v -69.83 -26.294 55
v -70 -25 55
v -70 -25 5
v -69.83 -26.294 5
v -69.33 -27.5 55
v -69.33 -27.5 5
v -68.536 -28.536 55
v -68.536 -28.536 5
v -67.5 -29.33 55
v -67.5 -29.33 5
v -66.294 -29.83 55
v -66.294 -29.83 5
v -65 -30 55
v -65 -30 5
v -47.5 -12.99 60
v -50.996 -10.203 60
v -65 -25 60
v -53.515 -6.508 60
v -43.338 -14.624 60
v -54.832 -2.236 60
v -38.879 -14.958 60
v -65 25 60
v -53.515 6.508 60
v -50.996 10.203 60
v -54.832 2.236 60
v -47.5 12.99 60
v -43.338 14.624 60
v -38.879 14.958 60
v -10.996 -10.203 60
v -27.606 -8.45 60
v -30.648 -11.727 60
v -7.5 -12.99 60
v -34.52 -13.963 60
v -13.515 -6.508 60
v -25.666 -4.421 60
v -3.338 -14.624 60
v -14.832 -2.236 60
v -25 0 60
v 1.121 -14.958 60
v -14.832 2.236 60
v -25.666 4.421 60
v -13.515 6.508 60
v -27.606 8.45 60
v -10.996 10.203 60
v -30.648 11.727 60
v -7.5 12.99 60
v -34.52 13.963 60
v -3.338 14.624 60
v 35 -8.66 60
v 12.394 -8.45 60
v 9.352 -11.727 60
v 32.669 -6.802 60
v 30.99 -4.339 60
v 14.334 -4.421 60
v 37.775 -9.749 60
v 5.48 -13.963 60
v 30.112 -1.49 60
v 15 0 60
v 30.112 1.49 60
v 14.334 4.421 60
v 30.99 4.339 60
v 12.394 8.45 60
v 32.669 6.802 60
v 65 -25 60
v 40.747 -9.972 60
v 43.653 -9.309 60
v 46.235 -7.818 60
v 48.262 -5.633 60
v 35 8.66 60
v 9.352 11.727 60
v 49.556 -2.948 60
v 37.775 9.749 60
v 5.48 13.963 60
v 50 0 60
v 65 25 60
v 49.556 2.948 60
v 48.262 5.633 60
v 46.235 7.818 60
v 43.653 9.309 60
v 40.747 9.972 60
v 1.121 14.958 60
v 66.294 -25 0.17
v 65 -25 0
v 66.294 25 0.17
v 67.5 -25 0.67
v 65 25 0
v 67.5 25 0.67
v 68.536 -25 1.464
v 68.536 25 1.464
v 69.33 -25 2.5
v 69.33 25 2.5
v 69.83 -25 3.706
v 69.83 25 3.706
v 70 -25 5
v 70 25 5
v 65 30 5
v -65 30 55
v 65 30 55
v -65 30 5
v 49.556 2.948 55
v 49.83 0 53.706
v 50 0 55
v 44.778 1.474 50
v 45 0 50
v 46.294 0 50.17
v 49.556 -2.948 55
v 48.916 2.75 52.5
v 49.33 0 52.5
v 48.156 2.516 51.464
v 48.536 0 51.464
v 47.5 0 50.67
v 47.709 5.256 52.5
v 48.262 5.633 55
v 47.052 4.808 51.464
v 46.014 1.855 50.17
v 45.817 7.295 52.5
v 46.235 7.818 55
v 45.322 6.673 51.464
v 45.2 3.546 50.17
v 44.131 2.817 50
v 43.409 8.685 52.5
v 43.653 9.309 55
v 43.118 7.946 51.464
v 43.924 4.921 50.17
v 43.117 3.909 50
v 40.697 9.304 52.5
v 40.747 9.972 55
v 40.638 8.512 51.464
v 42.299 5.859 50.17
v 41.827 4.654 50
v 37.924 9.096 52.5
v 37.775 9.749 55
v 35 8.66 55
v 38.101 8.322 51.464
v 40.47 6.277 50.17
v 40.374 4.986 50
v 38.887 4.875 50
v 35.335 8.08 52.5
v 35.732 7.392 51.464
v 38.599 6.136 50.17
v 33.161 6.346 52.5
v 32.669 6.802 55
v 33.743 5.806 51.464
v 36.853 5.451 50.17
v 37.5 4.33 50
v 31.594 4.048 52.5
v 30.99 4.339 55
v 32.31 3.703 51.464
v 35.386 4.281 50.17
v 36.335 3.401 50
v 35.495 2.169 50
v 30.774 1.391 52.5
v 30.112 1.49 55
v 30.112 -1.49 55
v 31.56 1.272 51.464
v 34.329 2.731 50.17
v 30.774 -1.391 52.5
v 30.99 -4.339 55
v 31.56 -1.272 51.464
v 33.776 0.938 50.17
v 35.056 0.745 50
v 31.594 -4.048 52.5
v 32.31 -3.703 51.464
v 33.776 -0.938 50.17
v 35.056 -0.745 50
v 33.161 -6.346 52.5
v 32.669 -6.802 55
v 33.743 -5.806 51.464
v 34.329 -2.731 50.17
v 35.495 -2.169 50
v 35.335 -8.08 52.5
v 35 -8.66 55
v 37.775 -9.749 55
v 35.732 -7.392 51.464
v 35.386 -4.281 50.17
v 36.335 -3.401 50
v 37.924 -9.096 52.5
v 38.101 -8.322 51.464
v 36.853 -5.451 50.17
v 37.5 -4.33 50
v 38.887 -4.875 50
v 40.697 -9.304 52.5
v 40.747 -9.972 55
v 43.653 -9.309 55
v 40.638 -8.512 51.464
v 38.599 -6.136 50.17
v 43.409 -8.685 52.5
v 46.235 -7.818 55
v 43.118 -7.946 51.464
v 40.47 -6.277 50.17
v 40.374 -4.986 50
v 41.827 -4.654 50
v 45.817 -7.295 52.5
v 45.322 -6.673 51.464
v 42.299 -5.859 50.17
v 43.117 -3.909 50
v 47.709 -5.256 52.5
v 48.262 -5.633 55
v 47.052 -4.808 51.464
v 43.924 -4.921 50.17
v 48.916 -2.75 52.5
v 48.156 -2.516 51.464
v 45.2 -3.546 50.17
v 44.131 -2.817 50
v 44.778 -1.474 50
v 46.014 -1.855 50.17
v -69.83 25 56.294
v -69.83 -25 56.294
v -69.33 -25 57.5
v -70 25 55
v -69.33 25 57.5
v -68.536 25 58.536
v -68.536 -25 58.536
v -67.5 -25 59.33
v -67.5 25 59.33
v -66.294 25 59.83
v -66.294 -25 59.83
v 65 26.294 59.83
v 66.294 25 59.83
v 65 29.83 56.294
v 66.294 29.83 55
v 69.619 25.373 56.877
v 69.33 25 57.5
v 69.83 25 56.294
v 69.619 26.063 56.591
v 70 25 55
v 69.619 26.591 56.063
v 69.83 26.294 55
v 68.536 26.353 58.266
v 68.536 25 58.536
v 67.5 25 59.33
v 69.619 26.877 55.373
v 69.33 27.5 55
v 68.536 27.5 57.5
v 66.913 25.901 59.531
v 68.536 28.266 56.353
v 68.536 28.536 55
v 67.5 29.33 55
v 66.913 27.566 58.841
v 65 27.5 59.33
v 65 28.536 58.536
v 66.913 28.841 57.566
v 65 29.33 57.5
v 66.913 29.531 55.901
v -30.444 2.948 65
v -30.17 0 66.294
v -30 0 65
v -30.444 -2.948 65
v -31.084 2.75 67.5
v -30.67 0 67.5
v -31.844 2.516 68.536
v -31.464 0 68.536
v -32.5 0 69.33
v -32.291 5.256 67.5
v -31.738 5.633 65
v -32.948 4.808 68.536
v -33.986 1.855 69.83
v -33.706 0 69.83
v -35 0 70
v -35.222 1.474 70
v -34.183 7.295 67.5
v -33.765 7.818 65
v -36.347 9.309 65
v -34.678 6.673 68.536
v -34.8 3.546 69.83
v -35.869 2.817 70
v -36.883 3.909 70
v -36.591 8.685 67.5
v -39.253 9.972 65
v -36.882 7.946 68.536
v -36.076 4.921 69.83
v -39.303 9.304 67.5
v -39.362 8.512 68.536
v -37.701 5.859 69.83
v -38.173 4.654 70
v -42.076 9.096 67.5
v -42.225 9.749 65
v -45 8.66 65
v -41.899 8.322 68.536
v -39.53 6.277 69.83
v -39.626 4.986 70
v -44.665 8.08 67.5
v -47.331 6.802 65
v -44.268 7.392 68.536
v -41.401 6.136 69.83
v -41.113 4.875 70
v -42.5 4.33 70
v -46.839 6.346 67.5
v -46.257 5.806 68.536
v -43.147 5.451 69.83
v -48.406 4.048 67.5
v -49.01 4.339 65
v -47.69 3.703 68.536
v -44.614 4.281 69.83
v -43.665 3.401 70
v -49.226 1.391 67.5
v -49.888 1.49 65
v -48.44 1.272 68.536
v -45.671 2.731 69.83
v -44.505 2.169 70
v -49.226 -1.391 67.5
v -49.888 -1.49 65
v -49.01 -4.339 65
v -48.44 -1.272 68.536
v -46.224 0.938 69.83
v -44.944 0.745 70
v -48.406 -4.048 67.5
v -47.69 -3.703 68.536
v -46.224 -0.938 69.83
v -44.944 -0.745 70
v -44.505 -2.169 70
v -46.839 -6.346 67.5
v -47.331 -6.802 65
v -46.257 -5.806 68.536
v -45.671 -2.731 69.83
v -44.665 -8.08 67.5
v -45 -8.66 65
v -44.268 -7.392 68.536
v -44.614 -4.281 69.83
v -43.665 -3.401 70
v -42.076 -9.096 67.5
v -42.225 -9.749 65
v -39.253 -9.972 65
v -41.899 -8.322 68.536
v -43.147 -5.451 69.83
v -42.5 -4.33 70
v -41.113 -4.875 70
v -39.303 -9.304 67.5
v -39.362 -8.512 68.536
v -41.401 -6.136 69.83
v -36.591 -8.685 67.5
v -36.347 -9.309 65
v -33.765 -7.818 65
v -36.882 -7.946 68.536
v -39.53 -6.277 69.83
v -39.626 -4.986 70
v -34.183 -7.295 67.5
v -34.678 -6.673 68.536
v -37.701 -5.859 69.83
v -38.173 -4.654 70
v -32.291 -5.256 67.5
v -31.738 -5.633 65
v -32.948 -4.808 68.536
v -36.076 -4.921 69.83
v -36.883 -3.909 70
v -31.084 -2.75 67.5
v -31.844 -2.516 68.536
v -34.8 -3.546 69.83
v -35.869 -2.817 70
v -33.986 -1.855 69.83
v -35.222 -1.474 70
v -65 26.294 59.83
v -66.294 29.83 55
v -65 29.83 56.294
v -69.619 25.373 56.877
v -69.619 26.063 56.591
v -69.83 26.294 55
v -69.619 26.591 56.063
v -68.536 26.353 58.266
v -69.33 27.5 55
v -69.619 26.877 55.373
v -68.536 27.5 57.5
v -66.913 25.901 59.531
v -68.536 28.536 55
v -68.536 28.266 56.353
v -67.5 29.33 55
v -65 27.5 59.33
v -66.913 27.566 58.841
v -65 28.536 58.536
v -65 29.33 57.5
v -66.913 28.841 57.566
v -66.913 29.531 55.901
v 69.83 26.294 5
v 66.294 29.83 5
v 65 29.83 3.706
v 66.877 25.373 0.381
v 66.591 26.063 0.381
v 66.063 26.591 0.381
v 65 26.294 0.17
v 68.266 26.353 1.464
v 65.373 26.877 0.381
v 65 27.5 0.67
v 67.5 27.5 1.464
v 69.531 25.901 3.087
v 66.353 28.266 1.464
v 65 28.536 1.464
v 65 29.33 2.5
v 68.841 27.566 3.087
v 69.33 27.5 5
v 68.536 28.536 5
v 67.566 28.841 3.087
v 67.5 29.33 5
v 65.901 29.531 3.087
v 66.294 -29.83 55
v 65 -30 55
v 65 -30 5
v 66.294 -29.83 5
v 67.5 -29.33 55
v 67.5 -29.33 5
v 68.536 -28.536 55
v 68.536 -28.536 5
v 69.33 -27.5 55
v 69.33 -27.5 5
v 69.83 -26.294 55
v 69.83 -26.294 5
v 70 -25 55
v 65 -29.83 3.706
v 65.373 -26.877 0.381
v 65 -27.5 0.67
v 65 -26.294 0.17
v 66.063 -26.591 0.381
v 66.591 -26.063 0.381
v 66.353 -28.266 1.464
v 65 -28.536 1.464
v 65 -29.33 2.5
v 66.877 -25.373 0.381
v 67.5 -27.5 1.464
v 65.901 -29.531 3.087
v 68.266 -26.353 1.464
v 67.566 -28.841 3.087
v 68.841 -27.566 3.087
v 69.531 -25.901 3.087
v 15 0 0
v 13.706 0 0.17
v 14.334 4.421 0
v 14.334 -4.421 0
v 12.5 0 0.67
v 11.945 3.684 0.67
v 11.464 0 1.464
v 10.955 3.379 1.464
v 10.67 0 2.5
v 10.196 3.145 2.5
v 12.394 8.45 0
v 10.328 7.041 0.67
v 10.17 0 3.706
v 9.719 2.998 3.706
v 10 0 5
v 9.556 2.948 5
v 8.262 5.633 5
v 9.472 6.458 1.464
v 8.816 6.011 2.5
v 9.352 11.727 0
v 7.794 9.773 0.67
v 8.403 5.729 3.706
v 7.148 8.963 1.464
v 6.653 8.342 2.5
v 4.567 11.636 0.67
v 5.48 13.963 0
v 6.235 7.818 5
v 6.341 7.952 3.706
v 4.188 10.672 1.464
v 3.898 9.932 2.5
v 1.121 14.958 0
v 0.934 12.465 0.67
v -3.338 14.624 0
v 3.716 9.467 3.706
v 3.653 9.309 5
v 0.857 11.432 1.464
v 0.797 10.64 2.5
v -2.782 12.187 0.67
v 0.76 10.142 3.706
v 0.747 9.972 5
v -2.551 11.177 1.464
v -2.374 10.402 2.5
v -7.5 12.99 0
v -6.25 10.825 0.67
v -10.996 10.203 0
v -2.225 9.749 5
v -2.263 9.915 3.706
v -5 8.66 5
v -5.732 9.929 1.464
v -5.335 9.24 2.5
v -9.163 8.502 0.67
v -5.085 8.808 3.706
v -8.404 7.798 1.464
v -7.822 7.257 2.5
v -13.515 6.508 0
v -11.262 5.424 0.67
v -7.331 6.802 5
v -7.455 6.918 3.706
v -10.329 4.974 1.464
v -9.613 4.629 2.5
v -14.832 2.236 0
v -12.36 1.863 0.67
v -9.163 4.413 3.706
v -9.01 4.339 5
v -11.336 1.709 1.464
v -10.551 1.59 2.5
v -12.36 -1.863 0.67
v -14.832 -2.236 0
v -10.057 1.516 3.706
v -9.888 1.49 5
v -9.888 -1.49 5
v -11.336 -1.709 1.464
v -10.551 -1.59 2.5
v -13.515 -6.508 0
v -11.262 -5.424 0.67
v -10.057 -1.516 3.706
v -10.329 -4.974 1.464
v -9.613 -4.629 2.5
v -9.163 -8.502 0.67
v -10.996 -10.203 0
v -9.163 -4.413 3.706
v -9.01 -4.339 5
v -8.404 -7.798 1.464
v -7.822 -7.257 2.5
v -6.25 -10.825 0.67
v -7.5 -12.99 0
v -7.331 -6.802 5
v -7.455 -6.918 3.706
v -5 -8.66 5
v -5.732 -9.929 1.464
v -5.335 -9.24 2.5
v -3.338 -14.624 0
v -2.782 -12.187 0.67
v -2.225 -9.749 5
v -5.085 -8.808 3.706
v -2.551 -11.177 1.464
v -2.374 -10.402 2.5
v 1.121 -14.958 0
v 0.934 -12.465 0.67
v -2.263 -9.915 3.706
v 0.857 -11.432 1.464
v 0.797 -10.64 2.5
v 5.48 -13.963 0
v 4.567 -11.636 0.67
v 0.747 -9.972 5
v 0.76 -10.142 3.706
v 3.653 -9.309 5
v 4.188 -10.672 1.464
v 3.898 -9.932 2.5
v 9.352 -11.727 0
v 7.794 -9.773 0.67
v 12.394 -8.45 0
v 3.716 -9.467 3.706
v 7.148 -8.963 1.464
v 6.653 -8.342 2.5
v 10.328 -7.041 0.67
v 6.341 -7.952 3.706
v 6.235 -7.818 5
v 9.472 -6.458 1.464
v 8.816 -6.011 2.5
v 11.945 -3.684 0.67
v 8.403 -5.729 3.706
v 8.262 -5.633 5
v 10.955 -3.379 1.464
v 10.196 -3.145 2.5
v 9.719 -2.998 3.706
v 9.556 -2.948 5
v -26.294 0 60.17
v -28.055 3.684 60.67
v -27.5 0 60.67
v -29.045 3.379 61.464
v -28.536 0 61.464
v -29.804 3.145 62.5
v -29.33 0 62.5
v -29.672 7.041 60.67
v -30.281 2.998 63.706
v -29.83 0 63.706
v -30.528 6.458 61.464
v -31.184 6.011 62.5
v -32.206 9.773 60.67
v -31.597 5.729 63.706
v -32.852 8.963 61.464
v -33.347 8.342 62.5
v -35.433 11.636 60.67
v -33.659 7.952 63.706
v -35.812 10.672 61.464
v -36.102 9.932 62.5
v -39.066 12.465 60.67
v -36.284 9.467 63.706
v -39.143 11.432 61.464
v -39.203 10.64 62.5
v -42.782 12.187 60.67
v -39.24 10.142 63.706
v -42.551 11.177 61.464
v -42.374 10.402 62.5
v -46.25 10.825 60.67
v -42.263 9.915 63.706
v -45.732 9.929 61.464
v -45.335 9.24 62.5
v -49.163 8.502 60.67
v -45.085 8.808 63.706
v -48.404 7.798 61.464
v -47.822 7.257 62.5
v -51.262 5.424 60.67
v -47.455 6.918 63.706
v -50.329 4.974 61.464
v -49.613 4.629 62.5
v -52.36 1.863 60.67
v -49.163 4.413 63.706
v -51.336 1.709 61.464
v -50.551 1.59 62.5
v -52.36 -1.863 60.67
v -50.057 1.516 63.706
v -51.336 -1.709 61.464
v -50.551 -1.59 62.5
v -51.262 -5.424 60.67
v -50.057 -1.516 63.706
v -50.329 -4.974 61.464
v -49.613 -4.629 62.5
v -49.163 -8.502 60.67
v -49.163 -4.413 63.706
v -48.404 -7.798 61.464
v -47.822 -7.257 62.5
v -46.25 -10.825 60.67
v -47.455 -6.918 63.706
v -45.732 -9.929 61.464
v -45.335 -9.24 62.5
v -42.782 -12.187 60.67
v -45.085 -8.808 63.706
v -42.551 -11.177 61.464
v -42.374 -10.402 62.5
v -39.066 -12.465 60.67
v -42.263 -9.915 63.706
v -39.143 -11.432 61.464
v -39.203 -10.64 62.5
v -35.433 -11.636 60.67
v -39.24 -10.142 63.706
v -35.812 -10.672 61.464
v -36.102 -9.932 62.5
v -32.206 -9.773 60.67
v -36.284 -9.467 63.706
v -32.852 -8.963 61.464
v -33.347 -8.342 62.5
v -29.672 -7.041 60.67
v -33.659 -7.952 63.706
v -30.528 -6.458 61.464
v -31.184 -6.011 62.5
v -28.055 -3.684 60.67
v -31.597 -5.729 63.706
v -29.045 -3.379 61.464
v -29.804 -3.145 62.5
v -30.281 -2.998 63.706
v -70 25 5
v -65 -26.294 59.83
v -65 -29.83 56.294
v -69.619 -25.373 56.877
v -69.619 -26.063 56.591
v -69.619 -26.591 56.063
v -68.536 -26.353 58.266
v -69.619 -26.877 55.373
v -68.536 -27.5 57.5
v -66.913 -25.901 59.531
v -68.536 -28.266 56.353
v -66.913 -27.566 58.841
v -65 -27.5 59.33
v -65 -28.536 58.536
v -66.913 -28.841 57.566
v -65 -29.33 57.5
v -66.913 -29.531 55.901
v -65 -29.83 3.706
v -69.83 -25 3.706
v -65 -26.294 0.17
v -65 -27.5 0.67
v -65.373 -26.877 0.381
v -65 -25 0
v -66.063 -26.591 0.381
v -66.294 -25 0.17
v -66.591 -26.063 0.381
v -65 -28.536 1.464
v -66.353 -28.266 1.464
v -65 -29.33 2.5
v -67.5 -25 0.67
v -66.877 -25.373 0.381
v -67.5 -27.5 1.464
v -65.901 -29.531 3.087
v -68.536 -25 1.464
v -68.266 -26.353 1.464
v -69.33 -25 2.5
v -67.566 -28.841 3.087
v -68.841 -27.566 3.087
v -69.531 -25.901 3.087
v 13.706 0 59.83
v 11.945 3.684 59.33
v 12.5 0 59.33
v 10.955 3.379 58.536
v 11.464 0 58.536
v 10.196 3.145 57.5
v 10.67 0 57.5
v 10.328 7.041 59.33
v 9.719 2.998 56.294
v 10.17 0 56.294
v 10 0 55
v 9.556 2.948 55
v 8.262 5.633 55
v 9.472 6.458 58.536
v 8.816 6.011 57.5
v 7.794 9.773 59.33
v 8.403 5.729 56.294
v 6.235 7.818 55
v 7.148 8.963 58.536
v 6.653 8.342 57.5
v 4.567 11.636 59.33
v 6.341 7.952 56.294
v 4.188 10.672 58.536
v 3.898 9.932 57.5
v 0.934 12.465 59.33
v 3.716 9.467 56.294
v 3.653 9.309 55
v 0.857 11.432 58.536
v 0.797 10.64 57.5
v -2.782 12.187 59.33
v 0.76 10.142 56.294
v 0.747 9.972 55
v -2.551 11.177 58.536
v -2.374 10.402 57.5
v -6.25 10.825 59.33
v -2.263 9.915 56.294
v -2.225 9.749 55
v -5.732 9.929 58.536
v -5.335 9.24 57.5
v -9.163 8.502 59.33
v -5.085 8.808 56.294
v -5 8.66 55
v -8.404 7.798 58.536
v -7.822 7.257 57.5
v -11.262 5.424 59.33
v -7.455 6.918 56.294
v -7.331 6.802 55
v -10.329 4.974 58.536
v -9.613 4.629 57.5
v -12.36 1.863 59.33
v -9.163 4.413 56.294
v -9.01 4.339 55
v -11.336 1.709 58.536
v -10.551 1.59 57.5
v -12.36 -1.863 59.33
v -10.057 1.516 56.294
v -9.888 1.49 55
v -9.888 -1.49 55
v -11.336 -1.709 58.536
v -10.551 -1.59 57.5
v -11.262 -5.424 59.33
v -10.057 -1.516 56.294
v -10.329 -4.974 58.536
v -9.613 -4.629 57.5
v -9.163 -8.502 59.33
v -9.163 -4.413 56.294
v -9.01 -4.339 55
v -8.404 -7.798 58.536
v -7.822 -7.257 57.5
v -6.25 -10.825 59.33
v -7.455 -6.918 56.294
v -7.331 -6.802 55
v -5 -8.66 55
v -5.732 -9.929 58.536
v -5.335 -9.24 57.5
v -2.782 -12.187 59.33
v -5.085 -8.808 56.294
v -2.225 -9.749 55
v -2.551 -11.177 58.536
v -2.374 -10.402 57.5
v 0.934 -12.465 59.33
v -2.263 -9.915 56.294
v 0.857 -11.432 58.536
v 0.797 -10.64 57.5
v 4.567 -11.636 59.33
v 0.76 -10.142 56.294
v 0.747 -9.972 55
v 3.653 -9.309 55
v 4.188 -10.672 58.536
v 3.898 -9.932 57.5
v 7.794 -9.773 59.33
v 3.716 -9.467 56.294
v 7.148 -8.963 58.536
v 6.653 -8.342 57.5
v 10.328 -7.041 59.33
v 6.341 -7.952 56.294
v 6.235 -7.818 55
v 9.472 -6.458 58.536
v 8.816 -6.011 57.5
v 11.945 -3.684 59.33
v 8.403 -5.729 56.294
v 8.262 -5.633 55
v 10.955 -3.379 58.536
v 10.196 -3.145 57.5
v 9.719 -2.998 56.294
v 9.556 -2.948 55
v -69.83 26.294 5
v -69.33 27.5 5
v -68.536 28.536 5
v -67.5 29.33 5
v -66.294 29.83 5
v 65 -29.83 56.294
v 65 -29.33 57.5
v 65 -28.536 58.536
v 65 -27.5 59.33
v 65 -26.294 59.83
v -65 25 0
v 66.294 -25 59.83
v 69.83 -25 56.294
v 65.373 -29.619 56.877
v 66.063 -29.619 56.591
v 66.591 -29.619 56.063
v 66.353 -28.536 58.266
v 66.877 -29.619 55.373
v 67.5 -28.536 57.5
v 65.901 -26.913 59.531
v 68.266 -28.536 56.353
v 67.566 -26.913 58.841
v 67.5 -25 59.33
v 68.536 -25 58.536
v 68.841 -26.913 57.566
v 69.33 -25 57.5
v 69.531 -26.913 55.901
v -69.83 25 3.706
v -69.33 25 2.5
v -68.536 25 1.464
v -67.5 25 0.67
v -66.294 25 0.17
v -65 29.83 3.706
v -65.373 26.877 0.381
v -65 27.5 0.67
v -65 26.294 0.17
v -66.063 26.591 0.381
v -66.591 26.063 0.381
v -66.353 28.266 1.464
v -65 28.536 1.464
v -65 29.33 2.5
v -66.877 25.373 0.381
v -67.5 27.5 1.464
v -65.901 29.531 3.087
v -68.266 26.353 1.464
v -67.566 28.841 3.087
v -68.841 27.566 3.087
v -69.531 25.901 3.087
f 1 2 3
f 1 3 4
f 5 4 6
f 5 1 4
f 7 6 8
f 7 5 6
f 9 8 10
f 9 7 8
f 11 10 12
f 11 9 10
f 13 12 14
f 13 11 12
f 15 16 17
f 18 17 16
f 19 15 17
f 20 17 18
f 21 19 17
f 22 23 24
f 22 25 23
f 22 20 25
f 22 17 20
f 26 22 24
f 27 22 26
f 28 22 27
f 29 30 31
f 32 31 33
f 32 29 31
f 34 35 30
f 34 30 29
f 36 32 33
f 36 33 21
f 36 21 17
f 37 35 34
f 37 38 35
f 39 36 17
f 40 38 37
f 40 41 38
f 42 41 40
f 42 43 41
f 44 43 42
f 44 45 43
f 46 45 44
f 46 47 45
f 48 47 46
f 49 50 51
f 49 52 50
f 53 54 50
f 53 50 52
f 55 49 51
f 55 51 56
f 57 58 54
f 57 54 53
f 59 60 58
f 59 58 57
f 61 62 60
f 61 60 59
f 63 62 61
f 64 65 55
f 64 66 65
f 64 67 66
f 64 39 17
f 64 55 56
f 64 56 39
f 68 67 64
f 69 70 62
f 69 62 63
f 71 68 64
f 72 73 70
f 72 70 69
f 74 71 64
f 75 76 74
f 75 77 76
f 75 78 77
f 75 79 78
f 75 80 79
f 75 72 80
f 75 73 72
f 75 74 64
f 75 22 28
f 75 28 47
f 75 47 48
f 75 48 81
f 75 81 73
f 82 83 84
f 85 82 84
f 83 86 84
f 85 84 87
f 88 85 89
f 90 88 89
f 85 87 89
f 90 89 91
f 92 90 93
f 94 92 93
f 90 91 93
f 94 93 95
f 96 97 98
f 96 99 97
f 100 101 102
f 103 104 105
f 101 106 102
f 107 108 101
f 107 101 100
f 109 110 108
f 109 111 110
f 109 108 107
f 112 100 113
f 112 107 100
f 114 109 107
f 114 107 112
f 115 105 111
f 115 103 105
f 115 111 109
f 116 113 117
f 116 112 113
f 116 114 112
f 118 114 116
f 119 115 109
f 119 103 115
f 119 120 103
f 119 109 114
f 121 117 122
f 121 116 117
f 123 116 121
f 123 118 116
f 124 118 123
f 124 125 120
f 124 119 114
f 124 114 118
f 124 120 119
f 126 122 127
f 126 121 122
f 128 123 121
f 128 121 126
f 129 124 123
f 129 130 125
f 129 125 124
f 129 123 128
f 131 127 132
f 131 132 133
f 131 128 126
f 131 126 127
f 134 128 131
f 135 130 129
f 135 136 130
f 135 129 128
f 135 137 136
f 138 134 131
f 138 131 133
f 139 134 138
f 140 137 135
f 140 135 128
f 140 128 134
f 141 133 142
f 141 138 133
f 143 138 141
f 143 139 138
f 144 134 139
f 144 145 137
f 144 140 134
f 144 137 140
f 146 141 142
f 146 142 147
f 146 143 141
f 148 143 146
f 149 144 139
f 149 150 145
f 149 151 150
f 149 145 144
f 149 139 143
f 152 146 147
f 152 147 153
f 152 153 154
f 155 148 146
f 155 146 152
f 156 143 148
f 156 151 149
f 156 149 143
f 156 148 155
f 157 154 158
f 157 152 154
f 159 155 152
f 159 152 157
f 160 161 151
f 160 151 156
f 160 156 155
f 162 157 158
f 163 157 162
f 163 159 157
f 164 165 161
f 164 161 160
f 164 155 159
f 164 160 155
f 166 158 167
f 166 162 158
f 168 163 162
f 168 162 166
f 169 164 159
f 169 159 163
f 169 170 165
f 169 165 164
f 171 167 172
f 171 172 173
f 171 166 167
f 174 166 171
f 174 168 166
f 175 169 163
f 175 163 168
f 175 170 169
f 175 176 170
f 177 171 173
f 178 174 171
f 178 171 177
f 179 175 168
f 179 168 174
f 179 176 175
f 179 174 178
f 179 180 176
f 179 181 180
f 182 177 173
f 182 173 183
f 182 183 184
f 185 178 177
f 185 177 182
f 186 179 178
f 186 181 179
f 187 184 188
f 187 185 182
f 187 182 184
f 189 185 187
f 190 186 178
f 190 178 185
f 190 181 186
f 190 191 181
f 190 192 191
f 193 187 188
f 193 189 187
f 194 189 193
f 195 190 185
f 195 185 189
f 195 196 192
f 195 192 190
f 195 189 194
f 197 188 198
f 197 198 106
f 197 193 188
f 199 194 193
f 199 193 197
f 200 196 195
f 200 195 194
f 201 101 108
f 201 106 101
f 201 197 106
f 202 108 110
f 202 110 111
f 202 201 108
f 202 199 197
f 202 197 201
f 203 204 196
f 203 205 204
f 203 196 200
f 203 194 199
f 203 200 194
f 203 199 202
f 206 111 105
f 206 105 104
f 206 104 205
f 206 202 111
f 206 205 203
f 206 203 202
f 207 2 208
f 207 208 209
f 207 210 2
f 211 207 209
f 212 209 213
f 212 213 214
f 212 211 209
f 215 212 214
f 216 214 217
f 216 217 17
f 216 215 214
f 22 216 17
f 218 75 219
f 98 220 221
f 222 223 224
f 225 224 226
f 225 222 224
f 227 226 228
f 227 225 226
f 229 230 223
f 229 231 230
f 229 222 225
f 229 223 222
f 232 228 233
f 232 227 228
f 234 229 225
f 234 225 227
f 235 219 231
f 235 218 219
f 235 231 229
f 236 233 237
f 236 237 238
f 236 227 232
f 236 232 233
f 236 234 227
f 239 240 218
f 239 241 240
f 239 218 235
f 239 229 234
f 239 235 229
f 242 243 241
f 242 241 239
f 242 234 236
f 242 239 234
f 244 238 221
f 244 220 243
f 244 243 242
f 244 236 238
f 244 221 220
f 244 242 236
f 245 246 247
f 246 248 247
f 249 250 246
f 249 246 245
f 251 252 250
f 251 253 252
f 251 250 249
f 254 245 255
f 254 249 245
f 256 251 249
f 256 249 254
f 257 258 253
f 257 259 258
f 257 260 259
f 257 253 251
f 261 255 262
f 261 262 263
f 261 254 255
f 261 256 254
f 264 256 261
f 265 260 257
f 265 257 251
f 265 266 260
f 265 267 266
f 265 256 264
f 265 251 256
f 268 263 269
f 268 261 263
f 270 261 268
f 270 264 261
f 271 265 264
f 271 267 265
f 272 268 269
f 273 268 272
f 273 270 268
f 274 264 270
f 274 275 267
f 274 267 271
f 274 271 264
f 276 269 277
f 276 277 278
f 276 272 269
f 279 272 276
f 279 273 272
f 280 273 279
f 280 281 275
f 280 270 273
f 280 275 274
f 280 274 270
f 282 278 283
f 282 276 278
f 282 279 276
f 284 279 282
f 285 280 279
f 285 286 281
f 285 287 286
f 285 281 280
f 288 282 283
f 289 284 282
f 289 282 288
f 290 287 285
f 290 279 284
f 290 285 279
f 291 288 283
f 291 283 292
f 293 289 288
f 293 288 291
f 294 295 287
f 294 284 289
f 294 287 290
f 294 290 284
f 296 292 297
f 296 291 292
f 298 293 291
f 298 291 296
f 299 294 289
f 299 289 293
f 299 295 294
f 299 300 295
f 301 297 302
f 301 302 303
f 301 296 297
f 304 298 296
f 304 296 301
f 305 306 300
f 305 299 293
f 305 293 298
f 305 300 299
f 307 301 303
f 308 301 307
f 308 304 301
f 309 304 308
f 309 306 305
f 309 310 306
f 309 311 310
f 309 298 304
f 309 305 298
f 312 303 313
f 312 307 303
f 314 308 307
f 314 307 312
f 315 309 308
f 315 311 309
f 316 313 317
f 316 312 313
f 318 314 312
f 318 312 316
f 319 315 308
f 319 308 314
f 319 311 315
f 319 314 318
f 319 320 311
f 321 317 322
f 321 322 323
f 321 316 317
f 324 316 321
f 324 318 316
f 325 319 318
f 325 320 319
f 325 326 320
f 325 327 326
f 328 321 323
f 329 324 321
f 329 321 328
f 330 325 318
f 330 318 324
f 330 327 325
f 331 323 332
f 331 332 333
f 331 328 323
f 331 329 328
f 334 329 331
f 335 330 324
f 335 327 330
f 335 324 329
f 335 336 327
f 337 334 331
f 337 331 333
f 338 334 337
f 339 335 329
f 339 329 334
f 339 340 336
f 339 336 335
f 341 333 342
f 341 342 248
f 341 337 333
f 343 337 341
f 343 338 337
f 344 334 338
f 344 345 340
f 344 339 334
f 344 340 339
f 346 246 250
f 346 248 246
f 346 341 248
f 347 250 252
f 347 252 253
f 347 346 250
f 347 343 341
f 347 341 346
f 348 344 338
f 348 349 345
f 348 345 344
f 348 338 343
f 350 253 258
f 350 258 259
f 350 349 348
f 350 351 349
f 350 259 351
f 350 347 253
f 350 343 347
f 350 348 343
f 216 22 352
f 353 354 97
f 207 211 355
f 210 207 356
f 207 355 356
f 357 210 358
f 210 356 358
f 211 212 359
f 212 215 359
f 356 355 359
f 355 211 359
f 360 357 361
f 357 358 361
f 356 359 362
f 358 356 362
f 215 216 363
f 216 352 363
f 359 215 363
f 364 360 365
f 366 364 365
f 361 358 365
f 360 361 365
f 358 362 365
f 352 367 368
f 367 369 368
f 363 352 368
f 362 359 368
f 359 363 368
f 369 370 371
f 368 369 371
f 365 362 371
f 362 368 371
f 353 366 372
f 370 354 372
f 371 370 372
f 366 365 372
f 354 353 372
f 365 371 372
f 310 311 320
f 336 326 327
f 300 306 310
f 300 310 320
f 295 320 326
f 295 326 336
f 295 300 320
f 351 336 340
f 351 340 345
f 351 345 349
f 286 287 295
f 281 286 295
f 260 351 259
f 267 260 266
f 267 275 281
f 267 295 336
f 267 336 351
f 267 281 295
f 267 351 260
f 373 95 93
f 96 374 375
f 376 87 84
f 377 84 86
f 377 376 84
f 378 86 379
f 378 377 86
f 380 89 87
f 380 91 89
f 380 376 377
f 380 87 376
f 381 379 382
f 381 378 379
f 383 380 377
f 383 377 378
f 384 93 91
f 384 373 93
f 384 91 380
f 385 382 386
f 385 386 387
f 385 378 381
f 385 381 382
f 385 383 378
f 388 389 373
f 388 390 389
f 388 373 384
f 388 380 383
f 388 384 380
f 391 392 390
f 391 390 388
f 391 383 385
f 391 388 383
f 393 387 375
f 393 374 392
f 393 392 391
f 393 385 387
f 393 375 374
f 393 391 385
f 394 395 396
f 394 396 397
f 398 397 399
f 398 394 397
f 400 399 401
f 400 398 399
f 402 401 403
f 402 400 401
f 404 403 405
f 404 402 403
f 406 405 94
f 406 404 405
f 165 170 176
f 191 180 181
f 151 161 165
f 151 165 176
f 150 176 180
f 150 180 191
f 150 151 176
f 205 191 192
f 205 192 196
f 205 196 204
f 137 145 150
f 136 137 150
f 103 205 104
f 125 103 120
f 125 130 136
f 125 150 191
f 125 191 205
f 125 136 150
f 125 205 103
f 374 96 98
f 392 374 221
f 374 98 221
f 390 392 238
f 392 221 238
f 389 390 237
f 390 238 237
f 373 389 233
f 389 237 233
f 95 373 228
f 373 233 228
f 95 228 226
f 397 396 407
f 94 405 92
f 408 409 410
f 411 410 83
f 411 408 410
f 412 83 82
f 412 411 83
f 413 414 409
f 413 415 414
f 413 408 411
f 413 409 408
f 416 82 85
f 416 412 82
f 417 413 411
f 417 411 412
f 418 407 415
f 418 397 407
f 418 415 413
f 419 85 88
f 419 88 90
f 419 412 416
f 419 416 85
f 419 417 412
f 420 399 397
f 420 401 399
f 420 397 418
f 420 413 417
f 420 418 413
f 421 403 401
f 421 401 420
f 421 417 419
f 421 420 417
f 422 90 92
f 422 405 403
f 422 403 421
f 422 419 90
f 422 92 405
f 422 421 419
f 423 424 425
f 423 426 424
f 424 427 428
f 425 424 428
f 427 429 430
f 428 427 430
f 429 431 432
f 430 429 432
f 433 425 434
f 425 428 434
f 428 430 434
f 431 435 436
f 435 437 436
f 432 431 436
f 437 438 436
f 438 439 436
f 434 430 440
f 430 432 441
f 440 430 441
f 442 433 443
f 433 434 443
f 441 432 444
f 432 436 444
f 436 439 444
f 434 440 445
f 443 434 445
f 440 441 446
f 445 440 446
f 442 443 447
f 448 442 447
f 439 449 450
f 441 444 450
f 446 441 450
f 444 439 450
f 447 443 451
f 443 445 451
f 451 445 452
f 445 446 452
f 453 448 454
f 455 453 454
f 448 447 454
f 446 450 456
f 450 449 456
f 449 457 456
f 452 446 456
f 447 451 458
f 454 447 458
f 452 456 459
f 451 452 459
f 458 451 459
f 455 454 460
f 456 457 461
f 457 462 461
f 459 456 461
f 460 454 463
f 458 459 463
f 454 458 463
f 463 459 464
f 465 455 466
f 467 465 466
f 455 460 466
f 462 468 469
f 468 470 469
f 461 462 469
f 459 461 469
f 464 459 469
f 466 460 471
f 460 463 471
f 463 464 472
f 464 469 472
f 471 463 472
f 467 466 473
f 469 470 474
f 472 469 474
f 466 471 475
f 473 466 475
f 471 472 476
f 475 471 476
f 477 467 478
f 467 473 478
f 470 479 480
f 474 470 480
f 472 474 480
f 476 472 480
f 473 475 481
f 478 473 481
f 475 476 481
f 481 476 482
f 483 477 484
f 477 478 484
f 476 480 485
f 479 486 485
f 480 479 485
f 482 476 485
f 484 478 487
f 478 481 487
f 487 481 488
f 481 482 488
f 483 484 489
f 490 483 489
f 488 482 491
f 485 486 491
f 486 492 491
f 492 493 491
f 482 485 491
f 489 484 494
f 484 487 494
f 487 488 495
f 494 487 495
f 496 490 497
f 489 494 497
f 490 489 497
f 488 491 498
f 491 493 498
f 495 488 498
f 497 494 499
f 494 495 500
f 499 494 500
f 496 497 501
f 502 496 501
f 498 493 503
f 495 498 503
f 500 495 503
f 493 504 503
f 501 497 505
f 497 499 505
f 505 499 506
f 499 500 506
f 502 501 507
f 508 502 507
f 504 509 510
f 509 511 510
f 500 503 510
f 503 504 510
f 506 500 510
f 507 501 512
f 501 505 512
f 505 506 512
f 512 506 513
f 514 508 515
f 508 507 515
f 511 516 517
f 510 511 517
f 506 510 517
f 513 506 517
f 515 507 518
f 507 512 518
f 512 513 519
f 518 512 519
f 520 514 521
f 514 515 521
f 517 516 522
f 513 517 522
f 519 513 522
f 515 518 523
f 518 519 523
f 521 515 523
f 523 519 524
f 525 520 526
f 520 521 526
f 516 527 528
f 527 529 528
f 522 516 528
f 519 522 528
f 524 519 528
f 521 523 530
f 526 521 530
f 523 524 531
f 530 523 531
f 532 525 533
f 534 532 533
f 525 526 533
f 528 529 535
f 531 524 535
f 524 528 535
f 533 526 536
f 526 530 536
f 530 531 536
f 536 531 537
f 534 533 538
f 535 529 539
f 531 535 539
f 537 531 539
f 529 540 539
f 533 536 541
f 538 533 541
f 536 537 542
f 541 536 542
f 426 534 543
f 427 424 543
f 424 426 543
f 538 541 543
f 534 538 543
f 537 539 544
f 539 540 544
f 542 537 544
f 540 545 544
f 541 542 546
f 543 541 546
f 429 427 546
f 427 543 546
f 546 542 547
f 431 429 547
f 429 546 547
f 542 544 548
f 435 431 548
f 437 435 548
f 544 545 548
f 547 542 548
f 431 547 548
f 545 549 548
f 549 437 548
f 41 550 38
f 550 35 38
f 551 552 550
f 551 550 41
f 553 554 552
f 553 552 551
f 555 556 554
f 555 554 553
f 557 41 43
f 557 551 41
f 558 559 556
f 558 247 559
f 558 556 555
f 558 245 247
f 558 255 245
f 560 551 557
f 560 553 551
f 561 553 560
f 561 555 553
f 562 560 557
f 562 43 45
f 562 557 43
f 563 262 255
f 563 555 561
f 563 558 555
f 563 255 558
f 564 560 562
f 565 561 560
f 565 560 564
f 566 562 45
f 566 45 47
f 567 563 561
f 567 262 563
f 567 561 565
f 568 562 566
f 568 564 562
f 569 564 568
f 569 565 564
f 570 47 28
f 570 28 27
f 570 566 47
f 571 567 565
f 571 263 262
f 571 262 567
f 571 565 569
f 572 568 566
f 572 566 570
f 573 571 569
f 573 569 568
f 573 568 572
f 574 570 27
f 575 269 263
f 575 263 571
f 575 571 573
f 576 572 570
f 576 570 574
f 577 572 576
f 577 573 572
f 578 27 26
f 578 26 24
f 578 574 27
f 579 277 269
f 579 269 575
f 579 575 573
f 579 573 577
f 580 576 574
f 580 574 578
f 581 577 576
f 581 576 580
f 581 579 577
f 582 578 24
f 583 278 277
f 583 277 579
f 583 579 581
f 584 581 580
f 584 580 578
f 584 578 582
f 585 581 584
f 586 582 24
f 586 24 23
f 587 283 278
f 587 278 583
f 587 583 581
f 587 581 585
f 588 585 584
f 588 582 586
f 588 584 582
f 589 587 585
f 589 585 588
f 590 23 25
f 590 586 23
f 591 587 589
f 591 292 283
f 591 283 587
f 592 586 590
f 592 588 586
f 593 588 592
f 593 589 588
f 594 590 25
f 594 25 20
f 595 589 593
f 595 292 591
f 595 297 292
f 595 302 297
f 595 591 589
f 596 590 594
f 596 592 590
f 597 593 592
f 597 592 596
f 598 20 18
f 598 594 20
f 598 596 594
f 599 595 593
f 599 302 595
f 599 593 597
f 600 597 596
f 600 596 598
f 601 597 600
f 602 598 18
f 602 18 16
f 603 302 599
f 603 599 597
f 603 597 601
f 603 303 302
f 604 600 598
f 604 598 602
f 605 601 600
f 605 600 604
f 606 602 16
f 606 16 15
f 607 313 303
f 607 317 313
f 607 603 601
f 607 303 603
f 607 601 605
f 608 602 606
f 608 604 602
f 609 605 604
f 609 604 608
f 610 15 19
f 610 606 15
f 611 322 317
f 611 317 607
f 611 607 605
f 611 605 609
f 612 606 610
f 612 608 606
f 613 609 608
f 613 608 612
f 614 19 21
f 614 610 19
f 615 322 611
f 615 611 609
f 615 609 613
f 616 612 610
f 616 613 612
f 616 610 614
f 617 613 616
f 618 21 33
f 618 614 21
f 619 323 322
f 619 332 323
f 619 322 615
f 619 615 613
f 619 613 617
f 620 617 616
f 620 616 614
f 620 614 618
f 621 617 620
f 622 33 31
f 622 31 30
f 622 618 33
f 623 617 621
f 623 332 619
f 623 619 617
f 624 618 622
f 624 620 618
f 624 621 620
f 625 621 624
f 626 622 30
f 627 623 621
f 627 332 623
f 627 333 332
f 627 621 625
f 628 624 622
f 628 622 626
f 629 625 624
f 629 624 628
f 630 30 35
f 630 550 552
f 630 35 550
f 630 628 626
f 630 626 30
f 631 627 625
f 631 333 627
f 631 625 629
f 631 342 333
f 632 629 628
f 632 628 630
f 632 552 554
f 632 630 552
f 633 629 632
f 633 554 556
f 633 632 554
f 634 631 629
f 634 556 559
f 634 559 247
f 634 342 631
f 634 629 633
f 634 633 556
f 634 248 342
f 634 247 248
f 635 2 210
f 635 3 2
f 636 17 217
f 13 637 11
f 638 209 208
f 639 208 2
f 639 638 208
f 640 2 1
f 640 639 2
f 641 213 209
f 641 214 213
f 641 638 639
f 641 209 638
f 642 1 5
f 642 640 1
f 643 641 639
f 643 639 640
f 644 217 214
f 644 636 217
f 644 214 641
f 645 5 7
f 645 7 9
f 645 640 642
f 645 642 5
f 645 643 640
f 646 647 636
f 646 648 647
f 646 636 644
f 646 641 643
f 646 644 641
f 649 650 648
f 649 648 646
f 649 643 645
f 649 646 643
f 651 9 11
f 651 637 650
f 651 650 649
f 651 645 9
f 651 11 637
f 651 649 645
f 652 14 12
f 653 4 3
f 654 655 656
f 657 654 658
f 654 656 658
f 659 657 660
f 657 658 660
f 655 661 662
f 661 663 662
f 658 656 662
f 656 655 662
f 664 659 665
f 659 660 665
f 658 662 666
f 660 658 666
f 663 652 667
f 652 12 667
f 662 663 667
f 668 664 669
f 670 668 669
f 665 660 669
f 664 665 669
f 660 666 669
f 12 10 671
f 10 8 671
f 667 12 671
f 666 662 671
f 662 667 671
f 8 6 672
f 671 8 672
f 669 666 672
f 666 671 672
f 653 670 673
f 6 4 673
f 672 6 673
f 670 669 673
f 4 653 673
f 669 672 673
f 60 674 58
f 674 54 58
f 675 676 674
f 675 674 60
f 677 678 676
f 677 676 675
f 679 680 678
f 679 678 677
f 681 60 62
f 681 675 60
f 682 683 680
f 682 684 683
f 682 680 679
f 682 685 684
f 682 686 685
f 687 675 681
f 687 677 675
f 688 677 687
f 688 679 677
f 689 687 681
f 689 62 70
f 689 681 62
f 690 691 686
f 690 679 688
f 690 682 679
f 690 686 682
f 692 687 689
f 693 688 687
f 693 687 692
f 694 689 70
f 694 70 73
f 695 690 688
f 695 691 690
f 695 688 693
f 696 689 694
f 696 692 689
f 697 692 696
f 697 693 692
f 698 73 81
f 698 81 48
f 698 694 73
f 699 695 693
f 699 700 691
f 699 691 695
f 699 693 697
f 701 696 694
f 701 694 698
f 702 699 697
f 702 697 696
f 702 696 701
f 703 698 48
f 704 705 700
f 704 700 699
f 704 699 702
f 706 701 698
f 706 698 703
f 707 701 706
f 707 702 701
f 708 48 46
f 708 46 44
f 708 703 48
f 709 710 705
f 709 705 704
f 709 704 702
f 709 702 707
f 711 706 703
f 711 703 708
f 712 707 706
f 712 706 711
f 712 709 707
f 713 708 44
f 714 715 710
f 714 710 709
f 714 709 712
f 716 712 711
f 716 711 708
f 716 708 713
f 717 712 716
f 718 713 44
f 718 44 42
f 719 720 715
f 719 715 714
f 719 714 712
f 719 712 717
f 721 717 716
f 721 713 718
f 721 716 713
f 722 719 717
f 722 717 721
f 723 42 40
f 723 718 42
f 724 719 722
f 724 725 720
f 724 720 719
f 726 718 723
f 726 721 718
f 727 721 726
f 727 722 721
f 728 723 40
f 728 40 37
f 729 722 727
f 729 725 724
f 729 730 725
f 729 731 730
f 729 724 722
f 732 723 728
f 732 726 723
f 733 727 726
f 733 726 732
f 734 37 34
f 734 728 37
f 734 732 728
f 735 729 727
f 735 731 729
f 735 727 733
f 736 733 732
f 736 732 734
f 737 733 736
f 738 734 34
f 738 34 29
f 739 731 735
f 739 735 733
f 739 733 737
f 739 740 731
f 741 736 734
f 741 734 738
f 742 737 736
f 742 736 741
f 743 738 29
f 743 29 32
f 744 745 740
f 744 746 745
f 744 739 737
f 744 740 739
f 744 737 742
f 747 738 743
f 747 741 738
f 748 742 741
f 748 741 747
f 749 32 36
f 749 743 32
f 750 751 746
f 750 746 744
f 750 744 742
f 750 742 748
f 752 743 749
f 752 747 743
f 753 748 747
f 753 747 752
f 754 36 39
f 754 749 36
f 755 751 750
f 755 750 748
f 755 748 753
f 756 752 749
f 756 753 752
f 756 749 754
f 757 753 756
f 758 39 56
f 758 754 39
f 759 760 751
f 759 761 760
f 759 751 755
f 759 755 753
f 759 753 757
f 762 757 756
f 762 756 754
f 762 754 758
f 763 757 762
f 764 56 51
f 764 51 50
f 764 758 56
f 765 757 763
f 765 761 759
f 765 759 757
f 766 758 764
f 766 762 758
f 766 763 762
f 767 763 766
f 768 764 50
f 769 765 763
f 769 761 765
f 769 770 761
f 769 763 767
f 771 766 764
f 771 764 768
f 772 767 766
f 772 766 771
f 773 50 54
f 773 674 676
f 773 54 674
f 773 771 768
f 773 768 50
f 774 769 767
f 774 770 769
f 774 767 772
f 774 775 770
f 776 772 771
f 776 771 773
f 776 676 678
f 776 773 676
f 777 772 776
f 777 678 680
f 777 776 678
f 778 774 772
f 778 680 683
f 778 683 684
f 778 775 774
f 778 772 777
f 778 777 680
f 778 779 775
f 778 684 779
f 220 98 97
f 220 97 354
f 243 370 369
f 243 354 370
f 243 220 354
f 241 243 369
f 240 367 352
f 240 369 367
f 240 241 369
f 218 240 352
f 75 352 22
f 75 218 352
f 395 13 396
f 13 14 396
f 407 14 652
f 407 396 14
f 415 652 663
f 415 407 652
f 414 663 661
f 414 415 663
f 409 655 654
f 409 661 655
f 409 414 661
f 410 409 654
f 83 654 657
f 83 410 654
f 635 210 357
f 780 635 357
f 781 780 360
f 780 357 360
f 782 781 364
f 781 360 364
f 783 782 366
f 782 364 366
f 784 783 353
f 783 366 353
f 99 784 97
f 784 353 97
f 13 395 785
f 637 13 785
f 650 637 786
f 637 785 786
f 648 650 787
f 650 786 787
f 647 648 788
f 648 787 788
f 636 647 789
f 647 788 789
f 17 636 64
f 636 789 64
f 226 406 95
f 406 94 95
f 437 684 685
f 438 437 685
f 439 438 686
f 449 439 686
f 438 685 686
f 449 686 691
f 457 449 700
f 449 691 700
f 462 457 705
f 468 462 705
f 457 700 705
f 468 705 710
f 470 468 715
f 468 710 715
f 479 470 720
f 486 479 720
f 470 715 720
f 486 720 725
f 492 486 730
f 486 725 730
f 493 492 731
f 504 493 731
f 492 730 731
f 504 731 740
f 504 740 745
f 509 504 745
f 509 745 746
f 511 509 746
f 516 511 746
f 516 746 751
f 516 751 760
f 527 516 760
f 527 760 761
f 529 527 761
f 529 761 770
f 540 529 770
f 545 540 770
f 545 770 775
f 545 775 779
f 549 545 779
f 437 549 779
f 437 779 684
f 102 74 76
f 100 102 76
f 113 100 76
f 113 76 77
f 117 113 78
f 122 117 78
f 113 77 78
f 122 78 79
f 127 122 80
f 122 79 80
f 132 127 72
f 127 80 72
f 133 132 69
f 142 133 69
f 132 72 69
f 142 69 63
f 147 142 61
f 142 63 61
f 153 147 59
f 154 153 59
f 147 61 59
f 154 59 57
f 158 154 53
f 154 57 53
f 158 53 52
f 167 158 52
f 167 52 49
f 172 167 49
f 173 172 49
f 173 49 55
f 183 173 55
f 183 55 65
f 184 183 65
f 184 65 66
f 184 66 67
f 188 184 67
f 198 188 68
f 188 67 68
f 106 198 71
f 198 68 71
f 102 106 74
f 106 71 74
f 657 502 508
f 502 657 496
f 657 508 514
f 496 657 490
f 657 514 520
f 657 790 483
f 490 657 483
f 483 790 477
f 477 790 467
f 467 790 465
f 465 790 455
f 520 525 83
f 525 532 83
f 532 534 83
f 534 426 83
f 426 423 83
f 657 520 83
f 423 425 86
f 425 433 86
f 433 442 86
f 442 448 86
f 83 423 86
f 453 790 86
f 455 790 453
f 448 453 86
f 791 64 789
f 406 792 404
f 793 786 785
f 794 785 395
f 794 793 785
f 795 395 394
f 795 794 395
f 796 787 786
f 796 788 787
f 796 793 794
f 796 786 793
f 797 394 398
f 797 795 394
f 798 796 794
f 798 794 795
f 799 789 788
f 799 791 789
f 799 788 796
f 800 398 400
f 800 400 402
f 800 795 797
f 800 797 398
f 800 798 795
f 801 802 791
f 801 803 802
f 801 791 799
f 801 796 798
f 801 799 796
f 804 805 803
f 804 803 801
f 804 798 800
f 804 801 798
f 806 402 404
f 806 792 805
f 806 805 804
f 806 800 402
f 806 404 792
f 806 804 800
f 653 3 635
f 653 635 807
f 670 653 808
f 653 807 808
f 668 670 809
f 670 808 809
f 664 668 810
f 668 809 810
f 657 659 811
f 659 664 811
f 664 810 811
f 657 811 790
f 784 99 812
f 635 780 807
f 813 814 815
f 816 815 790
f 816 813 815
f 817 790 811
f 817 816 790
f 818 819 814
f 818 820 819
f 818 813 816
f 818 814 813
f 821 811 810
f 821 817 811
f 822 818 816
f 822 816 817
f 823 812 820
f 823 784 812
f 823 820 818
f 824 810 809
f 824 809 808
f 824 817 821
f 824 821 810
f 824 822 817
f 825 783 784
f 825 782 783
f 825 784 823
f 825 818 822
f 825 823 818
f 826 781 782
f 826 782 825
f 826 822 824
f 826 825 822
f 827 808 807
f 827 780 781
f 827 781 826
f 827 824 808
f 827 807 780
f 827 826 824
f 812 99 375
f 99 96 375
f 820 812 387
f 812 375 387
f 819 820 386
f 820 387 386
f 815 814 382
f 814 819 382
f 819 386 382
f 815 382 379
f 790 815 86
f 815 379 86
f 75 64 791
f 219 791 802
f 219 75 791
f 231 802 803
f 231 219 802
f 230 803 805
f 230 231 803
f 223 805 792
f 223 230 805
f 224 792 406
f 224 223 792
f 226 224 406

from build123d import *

# Parameters (mm, degrees)
F0_W     = 140
F0_H     = 60
F1_DEPTH = 60
F2_R     = 10
F5_DEPTH = 10
F4_R     = 10
F6_DEPTH = 93.7
F3_R     = 10
F7_DEPTH = 10
F8_R     = 4.99999


# Not quite as in the source:
# - a fillet or chamfer is up to 0.001 mm smaller than in the source, because OpenCascade refuses the exact size


with BuildPart() as f1:
    # F0 (on Top) → F1 (new body)
    with BuildSketch(Plane.XY):
        Rectangle(F0_W, F0_H)
    extrude(amount=F1_DEPTH)

    # F2 (on face) → F5 (join)
    with BuildSketch(Plane.XY.offset(60)):
        with Locations((-40, 0)):
            Circle(F2_R)
    extrude(amount=F5_DEPTH)

    # F4 (on face) → F6 (cut)
    with BuildSketch(Plane.XY.offset(60)):
        Circle(F4_R)
    extrude(amount=-F6_DEPTH, mode=Mode.SUBTRACT)

    # F3 (on face) → F7 (cut)
    with BuildSketch(Plane.XY.offset(60)):
        with Locations((40, 0)):
            Circle(F3_R)
    extrude(amount=-F7_DEPTH, mode=Mode.SUBTRACT)

    # F8 (radius 5 in the source; OpenCascade refuses exactly that, so slightly less here)
    f8_edges = [f1.edges().sort_by_distance(p)[0] for p in [
        (0, 30, 60),
        (70, 0, 60),
        (0, -30, 60),
        (-70, 0, 60),
        (70, -30, 30),
        (70, 30, 30),
        (-70, -30, 30),
        (-70, 30, 30),
        (-50, 0, 70),
        (-10, 0, 60),
        (10, 0, 30),
        (-10, 0, 0),
        (30, 0, 50),
        (-50, 0, 60),
        (0, -30, 0),
        (70, 0, 0),
        (0, 30, 0),
        (-70, 0, 0),
    ]]
    fillet(f8_edges, radius=F8_R)


solid = f1.part
